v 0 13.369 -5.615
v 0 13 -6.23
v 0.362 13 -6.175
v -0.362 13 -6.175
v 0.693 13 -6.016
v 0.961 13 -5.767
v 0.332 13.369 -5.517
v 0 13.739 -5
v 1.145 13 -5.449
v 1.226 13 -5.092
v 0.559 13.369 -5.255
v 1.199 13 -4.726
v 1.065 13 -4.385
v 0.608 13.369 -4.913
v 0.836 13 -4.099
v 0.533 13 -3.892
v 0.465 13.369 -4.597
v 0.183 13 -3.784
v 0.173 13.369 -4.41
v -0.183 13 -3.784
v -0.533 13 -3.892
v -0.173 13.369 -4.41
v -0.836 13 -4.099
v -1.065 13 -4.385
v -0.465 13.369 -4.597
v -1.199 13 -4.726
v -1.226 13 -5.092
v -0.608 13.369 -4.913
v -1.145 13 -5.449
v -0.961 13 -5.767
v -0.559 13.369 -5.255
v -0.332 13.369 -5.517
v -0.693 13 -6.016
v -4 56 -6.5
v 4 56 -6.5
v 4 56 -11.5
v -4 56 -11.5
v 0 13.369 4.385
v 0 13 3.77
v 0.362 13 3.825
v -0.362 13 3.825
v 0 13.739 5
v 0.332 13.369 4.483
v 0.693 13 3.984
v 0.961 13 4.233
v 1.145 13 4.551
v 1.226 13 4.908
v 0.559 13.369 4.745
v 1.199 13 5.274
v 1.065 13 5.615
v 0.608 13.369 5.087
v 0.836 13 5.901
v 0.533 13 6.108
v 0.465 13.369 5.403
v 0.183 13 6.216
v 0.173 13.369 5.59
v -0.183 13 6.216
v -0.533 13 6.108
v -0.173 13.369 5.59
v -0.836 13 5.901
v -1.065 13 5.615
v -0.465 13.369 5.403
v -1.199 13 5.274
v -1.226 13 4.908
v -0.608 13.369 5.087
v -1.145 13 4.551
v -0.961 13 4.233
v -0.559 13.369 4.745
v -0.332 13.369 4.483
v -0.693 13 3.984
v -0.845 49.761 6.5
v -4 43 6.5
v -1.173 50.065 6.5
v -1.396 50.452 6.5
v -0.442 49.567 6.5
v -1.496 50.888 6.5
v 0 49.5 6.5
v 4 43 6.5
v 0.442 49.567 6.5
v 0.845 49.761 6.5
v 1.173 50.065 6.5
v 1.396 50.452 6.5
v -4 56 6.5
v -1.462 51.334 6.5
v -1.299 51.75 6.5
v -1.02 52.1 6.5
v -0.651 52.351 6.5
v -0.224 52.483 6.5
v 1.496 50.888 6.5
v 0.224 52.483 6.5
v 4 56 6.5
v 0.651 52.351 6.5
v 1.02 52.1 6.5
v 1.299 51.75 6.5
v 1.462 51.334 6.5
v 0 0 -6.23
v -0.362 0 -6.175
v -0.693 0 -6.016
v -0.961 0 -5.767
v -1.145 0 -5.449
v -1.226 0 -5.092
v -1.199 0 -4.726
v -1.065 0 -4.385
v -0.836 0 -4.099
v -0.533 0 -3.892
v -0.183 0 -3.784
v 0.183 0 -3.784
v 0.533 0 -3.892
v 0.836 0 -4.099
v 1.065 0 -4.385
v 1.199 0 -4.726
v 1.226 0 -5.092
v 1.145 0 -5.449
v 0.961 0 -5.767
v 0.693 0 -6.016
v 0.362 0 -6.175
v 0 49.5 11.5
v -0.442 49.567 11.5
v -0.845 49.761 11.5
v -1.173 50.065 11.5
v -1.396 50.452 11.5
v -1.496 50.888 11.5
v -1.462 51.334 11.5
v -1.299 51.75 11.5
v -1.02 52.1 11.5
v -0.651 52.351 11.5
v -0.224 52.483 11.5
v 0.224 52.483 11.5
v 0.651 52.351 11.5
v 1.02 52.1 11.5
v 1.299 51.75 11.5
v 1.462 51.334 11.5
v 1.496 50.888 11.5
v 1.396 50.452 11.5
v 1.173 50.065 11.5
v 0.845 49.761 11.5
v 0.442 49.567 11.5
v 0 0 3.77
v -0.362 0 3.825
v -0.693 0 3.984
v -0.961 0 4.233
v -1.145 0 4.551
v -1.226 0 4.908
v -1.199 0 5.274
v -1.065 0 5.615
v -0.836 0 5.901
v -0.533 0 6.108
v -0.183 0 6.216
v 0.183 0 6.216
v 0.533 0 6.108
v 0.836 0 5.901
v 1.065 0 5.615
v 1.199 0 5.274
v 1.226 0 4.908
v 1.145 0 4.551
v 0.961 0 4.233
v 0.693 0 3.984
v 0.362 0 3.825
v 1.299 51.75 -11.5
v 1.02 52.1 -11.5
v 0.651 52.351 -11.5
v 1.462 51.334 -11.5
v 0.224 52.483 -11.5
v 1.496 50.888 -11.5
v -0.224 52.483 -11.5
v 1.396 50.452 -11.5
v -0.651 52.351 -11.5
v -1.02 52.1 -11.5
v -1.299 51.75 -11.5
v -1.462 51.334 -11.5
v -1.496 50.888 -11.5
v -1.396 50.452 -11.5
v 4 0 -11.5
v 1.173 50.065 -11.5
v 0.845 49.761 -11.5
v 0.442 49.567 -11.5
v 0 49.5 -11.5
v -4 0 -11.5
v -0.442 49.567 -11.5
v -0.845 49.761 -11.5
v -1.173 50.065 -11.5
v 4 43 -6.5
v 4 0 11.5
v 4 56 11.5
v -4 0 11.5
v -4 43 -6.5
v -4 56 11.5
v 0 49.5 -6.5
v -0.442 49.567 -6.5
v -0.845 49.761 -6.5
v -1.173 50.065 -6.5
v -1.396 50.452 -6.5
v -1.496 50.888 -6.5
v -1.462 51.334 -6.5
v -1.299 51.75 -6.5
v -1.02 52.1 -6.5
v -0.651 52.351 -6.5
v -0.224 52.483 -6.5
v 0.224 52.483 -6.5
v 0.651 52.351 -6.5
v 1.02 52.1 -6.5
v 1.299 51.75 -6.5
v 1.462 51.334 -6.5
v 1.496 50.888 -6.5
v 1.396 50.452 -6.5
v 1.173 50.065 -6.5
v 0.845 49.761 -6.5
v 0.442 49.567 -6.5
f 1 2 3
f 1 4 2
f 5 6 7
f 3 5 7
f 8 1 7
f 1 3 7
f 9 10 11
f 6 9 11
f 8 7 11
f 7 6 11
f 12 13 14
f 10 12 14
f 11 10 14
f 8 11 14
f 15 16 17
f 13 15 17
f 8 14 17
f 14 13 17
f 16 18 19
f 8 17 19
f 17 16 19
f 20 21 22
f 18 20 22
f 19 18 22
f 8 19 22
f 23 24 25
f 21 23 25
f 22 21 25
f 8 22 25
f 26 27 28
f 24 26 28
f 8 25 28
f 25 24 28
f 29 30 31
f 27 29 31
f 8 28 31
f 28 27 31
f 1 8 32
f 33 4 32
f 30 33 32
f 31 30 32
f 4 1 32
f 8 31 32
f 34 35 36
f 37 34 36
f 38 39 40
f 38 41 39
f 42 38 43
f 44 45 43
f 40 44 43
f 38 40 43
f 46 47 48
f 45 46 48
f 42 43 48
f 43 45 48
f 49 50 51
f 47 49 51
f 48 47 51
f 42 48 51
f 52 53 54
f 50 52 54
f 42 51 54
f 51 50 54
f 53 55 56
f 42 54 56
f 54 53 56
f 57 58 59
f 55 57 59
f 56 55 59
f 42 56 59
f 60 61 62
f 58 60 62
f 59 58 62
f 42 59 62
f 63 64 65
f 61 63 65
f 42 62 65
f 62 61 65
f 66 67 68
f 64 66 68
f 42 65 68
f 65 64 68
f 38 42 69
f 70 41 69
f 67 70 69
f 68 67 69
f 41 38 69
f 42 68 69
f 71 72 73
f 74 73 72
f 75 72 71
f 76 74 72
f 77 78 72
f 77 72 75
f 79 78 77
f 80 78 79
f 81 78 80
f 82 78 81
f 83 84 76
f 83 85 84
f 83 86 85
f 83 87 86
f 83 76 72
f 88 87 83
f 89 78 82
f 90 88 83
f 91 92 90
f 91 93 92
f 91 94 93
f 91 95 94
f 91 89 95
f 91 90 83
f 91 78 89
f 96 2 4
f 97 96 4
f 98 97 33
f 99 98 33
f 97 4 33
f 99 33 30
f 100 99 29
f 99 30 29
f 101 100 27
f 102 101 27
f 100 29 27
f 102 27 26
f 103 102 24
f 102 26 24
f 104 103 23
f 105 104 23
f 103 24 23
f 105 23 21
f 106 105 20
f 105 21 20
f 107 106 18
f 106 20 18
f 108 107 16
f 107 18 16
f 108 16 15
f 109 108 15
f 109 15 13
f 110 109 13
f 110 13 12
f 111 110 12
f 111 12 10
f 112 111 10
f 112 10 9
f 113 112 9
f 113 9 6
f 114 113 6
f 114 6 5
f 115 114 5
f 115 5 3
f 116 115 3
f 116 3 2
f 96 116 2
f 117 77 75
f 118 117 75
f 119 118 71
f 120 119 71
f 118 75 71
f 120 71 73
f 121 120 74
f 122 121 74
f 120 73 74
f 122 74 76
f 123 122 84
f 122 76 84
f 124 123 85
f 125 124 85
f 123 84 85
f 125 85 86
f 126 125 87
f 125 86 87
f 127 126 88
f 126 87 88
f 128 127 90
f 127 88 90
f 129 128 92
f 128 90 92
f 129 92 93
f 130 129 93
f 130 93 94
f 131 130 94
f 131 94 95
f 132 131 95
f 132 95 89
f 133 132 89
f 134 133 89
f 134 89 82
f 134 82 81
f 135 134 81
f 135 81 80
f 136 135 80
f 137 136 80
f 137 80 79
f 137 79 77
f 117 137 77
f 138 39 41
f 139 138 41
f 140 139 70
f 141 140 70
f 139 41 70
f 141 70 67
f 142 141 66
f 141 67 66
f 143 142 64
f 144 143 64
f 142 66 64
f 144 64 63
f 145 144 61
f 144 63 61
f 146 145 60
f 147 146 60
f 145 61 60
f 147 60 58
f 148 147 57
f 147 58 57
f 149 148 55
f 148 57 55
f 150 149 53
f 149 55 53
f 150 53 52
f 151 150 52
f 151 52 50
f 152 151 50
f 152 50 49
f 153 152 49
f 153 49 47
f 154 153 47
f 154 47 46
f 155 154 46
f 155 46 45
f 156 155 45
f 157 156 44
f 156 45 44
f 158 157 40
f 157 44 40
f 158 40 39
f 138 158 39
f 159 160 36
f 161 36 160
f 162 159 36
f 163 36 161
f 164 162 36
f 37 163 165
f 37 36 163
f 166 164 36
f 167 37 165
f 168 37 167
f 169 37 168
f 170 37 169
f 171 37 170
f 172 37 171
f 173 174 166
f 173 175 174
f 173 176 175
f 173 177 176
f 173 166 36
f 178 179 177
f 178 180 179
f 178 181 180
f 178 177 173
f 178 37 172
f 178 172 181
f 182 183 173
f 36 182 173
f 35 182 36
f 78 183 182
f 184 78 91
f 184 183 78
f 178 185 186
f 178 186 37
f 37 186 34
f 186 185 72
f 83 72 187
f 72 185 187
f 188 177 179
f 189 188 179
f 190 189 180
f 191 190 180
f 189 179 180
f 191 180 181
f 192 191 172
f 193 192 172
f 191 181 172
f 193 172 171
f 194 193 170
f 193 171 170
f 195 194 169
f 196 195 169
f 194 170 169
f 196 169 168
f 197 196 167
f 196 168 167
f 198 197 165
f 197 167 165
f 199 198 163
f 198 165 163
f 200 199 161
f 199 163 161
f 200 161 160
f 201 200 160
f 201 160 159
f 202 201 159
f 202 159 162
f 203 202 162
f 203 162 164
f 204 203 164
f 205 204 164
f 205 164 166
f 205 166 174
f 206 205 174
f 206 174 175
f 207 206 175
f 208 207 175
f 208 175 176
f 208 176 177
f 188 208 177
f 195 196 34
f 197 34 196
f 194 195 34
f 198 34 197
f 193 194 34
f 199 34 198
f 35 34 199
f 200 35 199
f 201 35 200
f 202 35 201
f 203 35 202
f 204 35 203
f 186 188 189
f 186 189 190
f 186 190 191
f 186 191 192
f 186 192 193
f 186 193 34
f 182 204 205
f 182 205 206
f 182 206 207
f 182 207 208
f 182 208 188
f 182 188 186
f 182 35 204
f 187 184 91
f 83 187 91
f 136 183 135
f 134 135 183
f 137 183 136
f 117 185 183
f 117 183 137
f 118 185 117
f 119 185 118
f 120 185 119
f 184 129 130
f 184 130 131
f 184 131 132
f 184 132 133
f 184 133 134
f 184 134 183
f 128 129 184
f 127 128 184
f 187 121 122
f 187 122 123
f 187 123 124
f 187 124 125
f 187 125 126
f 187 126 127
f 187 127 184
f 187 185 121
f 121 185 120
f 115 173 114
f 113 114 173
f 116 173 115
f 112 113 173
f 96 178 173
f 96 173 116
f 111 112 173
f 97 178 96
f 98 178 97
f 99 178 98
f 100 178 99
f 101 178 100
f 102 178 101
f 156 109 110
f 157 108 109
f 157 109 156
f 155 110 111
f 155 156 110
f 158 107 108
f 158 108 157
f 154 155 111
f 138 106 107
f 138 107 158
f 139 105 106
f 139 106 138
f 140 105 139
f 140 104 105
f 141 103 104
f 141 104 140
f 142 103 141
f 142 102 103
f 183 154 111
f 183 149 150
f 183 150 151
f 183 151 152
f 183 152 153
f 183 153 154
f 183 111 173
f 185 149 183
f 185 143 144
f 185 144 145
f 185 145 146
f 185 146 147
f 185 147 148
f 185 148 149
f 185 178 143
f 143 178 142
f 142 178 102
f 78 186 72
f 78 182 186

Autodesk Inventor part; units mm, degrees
ref_plane "YZ Plane" through (0, 0, 0) normal (1, 0, 0) x (0, 1, 0)
ref_plane "XZ Plane" through (0, 0, 0) normal (0, 1, 0) x (-1, 0, 0)
ref_plane "XY Plane" through (0, 0, 0) normal (0, 0, 1) x (1, 0, 0)
sketch "Sketch1" plane through (0, 0, 0) normal (1, 0, 0) x (0, 1, 0)
  line L0 (0, 11.5) -> (56, 11.5)
  line L1 (56, 11.5) -> (56, -11.5)
  line L2 (56, -11.5) -> (0, -11.5)
  line L3 (0, -11.5) -> (0, 11.5)
  point P0 (0, 0)
  dimension "d0" = 0
  dimension "d1" = 23
  dimension "d2" = 56
  dimension "d3" = 11.5
extrude "Extrusion1" add sketch "Sketch1" along normal mid plane 8
sketch "Sketch2" plane through (4, 0, 0) normal (1, 0, 0) x (0, 0, -1)
  line L0 (11.5, 56) -> (-11.5, 56) projected
  line L1 (-6.5, 56) -> (6.5, 56)
  line L2 (6.5, 56) -> (6.5, 43)
  line L3 (6.5, 43) -> (-6.5, 43)
  line L4 (-6.5, 43) -> (-6.5, 56)
  point P0 (0, 0)
  dimension "d6" = 13
  dimension "d7" = 13
  dimension "d8" = 6.5
extrude "Extrusion2" cut sketch "Sketch2" against normal through all
sketch "Sketch4" plane through (-4, 0, 11.5) normal (0, 0, 1) x (1, 0, 0)
  circle A0 centre (4, 51) radius 1.5
  line L0 (0, 56) -> (8, 56) projected
  line L1 (0, 0) -> (8, 0) projected
  point P0 (4, 0)
  point P1 (4, 0)
  dimension "d12" = 3
  dimension "d13" = 5
hole "Hole1" at (0, 51, 11.5) direction (0, 0, -1) diameter 3 end through all
sketch "Sketch5" plane through (-4, 0, -11.5) normal (0, -1, 0) x (1, 0, 0)
  circle A0 centre (4, 16.5) radius 1.5
  circle A1 centre (4, 6.5) radius 1.5
  point P0 (4, 11.5)
  dimension "d21" = 3
  dimension "d23" = 10
  dimension "d24" = 5
hole "Hole2" at (0, 0, 5) at (0, 0, -5) direction (0, 1, 0) diameter 2.459 depth 13 tip angle 118 thread size "M3x0.5" class "6H" standard "ISO Metric profile"
equation "\"d3\" = 0.5 * d1"
equation "\"d8\" = 0.5 * d6"
equation "\"d24\" = 0.5 * d23"
properties part number "Gripper_Outer_Support_2" material "Aluminum 6061"
